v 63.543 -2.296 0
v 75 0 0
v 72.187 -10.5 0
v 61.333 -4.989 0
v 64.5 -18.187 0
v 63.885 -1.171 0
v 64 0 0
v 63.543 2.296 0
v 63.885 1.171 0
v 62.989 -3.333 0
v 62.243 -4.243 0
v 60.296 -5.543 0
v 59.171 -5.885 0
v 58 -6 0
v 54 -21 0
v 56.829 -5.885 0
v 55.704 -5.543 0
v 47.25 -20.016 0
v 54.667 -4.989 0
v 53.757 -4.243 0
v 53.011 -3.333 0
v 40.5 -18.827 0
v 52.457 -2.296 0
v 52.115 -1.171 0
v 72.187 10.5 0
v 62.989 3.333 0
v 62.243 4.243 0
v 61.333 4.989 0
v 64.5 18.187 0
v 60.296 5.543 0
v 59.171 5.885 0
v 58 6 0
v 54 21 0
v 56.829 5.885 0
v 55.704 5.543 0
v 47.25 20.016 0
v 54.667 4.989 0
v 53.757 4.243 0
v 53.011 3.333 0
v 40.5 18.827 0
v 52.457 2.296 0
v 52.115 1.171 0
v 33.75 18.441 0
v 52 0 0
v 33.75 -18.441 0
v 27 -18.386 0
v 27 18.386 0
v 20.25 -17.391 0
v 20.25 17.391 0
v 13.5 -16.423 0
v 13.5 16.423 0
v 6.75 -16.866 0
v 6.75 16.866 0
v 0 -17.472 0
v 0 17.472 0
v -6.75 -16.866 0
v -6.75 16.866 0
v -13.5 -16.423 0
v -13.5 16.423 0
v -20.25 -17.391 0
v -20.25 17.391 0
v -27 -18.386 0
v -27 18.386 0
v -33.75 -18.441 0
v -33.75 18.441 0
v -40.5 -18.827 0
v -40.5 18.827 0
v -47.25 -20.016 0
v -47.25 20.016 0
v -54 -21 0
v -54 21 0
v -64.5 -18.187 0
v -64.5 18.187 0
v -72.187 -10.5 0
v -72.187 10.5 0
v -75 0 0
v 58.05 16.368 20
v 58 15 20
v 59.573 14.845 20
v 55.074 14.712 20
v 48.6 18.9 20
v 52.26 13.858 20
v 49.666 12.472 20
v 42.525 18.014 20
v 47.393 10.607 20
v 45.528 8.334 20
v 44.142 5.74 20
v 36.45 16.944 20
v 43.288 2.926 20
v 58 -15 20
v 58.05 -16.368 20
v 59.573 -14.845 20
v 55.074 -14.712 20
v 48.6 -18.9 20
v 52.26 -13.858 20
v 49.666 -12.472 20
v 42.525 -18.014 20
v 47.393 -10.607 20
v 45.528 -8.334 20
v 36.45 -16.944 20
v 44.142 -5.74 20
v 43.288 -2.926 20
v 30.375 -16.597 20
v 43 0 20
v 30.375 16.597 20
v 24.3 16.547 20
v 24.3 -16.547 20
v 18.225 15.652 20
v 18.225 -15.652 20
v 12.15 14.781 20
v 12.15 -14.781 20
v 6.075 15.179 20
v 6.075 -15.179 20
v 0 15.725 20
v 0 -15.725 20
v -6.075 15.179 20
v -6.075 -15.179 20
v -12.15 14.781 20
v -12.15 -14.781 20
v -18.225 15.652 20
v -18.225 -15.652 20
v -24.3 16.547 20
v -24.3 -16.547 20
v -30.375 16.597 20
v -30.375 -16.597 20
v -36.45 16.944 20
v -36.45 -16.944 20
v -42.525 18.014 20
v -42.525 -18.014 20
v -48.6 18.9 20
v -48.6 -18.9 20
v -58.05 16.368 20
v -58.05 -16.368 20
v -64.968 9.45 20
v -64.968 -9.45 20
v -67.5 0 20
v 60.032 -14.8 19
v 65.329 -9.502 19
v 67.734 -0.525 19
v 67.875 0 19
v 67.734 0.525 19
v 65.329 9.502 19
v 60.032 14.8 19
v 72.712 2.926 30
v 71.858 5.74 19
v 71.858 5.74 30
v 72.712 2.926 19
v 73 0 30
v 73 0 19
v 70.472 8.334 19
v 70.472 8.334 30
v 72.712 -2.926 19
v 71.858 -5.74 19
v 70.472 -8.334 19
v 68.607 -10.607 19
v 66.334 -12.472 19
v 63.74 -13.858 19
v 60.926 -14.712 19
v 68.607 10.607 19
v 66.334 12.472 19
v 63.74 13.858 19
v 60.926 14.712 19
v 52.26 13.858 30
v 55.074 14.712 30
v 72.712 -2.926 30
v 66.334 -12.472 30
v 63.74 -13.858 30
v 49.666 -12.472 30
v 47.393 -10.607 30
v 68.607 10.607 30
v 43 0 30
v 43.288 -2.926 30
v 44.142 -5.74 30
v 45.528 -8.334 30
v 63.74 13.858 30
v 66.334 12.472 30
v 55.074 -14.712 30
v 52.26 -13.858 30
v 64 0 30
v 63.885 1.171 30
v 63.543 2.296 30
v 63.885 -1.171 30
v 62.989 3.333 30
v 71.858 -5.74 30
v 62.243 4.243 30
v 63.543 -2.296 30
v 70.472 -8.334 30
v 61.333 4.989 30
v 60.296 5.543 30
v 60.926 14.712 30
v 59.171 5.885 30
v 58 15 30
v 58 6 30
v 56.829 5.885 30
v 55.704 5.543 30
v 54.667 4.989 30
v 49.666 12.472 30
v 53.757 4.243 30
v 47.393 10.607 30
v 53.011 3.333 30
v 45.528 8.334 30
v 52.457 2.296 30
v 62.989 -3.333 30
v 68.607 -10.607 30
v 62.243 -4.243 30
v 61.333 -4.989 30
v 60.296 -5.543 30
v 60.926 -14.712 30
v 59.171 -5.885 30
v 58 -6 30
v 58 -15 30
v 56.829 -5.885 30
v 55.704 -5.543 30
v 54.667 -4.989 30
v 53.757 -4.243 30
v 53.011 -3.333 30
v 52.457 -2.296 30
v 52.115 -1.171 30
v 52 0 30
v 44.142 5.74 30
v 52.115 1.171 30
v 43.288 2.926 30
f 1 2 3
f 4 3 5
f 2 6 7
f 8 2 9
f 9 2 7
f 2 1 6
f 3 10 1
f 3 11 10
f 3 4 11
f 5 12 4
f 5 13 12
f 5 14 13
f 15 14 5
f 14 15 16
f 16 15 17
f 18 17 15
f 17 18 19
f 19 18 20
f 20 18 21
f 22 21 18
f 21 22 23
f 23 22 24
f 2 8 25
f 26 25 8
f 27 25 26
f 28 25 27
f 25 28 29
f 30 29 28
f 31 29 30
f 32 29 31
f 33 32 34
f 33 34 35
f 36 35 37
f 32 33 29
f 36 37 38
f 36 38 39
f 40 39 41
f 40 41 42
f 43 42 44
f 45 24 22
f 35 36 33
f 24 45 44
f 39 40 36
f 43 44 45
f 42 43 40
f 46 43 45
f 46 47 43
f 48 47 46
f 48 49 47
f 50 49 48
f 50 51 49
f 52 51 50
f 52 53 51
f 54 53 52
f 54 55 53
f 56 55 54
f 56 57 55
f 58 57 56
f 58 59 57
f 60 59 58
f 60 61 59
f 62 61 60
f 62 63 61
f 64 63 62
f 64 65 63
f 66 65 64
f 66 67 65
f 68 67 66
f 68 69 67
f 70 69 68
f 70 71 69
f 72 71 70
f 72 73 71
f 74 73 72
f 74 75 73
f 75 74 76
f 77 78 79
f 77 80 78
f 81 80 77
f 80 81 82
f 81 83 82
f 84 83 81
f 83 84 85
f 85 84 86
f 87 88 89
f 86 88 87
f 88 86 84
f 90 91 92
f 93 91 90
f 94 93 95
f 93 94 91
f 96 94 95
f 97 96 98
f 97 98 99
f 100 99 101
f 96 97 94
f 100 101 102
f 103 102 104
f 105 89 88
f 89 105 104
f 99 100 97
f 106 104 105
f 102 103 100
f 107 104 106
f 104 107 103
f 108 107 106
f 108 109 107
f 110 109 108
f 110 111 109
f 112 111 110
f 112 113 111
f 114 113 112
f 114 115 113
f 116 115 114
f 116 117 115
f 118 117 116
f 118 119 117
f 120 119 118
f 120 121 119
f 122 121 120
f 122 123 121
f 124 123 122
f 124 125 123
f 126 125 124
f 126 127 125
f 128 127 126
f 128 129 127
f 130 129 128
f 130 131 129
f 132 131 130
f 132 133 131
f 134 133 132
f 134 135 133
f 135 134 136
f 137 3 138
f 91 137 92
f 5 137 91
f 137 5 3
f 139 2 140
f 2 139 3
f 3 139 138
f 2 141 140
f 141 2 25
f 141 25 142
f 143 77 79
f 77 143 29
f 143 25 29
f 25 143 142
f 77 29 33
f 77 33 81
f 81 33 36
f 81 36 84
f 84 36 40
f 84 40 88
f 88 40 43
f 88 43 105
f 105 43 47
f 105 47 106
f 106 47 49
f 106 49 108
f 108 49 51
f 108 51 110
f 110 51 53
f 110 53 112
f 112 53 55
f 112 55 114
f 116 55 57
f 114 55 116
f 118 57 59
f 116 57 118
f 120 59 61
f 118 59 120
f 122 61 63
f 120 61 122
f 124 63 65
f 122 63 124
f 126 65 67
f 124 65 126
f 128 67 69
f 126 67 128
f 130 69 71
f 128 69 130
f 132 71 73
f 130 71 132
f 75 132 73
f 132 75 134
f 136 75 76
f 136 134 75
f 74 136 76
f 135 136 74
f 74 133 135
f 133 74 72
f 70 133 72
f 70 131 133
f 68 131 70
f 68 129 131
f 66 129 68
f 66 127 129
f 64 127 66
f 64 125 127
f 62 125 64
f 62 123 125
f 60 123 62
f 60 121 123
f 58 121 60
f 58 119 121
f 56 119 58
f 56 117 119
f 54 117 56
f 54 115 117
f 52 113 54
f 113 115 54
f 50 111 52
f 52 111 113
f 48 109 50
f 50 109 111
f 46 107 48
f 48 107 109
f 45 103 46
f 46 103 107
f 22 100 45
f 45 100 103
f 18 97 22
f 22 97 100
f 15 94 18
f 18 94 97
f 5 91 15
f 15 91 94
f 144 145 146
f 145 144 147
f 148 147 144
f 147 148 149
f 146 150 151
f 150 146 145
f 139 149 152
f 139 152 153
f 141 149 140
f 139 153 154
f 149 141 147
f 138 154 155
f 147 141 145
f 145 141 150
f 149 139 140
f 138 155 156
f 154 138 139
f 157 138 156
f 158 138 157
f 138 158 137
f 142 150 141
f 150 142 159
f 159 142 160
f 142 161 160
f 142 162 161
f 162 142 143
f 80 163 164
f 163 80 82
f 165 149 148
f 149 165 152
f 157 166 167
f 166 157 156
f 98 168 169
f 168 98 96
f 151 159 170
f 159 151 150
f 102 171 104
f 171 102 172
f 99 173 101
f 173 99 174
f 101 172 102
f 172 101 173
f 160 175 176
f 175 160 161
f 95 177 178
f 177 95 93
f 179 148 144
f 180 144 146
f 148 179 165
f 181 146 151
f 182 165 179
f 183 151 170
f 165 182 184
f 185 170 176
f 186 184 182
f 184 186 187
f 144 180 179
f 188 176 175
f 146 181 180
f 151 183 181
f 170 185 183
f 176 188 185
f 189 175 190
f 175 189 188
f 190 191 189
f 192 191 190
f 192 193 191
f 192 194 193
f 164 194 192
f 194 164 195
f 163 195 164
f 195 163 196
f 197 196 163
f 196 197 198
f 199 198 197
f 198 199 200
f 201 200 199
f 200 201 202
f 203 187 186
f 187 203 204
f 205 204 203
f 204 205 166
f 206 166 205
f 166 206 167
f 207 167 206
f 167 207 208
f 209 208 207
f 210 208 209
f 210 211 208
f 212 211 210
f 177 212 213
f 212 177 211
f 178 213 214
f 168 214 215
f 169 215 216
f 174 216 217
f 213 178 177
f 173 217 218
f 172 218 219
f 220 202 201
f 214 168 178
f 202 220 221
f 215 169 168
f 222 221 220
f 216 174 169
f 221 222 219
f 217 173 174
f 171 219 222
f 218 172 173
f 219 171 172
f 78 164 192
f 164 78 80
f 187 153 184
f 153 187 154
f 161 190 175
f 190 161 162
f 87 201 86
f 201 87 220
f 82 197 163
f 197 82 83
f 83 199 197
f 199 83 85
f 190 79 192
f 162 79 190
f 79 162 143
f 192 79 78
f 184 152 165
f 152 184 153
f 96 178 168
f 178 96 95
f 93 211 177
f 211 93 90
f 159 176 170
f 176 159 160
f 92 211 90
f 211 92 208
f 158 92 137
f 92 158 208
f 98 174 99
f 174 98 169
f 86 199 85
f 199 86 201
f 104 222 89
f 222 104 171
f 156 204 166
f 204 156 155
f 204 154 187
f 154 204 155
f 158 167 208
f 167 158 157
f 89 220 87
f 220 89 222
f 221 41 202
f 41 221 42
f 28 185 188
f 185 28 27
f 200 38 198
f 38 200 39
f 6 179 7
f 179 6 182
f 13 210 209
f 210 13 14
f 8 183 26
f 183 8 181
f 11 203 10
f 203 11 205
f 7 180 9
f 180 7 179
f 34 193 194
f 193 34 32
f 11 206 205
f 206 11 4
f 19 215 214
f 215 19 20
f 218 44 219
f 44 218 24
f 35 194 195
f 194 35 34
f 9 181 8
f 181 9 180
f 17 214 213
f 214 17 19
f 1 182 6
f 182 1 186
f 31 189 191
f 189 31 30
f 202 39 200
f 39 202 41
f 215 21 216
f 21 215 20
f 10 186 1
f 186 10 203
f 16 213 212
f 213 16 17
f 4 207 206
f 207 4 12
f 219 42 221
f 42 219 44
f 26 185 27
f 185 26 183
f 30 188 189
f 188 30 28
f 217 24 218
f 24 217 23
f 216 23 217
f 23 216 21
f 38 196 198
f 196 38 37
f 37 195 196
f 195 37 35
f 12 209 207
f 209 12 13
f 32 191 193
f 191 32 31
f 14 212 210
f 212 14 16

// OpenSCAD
$fn = 32;

// ----------------------------------------------------------------------
// Handle: 150 x 42 mm grip, 20 mm thick
// ----------------------------------------------------------------------

// --- parameters (mm) ---
length = 150;             // grip length
width = 42;               // grip width
thickness = 20;           // grip thickness
waist = 0.8;              // width factor at the middle
draft = 0.9;              // top face scale of the extrusion
scallops = 4;             // finger rests per side
ripple = 0.04;            // depth factor of the finger rests
boss_d = 30;              // mounting boss diameter
boss_h = 10;              // mounting boss height
boss_hole_d = 12;         // screw clearance through the boss
boss_r = 58;              // boss centre from the grip centre

/* ergonomic grip outline, closed spline-like polygon in the XY plane */
grip = [[-54, 21], [-47.25, 20.016], [-40.5, 18.827], [-33.75, 18.441], [-27, 18.386], [-20.25, 17.391], [-13.5, 16.423], [-6.75, 16.866], [0, 17.472], [6.75, 16.866], [13.5, 16.423], [20.25, 17.391], [27, 18.386], [33.75, 18.441], [40.5, 18.827], [47.25, 20.016], [54, 21], [64.5, 18.187], [72.187, 10.5], [75, 0], [72.187, -10.5], [64.5, -18.187], [54, -21], [54, -21], [47.25, -20.016], [40.5, -18.827], [33.75, -18.441], [27, -18.386], [20.25, -17.391], [13.5, -16.423], [6.75, -16.866], [0, -17.472], [-6.75, -16.866], [-13.5, -16.423], [-20.25, -17.391], [-27, -18.386], [-33.75, -18.441], [-40.5, -18.827], [-47.25, -20.016], [-54, -21], [-64.5, -18.187], [-72.187, -10.5], [-75, 0], [-72.187, 10.5], [-64.5, 18.187], [-54, 21]];

module grip_body() {
  linear_extrude(height = thickness, scale = draft) polygon(grip);
}

module boss_body() {
  /* sunk 1 mm into the grip so the joint overlaps */
  translate([boss_r, 0, thickness - 1]) cylinder(h = boss_h + 1, d = boss_d);
}

difference() {
  union() {
    grip_body();
    boss_body();
  }
  translate([boss_r, 0, -1]) cylinder(h = thickness + boss_h + 2, d = boss_hole_d);
}
